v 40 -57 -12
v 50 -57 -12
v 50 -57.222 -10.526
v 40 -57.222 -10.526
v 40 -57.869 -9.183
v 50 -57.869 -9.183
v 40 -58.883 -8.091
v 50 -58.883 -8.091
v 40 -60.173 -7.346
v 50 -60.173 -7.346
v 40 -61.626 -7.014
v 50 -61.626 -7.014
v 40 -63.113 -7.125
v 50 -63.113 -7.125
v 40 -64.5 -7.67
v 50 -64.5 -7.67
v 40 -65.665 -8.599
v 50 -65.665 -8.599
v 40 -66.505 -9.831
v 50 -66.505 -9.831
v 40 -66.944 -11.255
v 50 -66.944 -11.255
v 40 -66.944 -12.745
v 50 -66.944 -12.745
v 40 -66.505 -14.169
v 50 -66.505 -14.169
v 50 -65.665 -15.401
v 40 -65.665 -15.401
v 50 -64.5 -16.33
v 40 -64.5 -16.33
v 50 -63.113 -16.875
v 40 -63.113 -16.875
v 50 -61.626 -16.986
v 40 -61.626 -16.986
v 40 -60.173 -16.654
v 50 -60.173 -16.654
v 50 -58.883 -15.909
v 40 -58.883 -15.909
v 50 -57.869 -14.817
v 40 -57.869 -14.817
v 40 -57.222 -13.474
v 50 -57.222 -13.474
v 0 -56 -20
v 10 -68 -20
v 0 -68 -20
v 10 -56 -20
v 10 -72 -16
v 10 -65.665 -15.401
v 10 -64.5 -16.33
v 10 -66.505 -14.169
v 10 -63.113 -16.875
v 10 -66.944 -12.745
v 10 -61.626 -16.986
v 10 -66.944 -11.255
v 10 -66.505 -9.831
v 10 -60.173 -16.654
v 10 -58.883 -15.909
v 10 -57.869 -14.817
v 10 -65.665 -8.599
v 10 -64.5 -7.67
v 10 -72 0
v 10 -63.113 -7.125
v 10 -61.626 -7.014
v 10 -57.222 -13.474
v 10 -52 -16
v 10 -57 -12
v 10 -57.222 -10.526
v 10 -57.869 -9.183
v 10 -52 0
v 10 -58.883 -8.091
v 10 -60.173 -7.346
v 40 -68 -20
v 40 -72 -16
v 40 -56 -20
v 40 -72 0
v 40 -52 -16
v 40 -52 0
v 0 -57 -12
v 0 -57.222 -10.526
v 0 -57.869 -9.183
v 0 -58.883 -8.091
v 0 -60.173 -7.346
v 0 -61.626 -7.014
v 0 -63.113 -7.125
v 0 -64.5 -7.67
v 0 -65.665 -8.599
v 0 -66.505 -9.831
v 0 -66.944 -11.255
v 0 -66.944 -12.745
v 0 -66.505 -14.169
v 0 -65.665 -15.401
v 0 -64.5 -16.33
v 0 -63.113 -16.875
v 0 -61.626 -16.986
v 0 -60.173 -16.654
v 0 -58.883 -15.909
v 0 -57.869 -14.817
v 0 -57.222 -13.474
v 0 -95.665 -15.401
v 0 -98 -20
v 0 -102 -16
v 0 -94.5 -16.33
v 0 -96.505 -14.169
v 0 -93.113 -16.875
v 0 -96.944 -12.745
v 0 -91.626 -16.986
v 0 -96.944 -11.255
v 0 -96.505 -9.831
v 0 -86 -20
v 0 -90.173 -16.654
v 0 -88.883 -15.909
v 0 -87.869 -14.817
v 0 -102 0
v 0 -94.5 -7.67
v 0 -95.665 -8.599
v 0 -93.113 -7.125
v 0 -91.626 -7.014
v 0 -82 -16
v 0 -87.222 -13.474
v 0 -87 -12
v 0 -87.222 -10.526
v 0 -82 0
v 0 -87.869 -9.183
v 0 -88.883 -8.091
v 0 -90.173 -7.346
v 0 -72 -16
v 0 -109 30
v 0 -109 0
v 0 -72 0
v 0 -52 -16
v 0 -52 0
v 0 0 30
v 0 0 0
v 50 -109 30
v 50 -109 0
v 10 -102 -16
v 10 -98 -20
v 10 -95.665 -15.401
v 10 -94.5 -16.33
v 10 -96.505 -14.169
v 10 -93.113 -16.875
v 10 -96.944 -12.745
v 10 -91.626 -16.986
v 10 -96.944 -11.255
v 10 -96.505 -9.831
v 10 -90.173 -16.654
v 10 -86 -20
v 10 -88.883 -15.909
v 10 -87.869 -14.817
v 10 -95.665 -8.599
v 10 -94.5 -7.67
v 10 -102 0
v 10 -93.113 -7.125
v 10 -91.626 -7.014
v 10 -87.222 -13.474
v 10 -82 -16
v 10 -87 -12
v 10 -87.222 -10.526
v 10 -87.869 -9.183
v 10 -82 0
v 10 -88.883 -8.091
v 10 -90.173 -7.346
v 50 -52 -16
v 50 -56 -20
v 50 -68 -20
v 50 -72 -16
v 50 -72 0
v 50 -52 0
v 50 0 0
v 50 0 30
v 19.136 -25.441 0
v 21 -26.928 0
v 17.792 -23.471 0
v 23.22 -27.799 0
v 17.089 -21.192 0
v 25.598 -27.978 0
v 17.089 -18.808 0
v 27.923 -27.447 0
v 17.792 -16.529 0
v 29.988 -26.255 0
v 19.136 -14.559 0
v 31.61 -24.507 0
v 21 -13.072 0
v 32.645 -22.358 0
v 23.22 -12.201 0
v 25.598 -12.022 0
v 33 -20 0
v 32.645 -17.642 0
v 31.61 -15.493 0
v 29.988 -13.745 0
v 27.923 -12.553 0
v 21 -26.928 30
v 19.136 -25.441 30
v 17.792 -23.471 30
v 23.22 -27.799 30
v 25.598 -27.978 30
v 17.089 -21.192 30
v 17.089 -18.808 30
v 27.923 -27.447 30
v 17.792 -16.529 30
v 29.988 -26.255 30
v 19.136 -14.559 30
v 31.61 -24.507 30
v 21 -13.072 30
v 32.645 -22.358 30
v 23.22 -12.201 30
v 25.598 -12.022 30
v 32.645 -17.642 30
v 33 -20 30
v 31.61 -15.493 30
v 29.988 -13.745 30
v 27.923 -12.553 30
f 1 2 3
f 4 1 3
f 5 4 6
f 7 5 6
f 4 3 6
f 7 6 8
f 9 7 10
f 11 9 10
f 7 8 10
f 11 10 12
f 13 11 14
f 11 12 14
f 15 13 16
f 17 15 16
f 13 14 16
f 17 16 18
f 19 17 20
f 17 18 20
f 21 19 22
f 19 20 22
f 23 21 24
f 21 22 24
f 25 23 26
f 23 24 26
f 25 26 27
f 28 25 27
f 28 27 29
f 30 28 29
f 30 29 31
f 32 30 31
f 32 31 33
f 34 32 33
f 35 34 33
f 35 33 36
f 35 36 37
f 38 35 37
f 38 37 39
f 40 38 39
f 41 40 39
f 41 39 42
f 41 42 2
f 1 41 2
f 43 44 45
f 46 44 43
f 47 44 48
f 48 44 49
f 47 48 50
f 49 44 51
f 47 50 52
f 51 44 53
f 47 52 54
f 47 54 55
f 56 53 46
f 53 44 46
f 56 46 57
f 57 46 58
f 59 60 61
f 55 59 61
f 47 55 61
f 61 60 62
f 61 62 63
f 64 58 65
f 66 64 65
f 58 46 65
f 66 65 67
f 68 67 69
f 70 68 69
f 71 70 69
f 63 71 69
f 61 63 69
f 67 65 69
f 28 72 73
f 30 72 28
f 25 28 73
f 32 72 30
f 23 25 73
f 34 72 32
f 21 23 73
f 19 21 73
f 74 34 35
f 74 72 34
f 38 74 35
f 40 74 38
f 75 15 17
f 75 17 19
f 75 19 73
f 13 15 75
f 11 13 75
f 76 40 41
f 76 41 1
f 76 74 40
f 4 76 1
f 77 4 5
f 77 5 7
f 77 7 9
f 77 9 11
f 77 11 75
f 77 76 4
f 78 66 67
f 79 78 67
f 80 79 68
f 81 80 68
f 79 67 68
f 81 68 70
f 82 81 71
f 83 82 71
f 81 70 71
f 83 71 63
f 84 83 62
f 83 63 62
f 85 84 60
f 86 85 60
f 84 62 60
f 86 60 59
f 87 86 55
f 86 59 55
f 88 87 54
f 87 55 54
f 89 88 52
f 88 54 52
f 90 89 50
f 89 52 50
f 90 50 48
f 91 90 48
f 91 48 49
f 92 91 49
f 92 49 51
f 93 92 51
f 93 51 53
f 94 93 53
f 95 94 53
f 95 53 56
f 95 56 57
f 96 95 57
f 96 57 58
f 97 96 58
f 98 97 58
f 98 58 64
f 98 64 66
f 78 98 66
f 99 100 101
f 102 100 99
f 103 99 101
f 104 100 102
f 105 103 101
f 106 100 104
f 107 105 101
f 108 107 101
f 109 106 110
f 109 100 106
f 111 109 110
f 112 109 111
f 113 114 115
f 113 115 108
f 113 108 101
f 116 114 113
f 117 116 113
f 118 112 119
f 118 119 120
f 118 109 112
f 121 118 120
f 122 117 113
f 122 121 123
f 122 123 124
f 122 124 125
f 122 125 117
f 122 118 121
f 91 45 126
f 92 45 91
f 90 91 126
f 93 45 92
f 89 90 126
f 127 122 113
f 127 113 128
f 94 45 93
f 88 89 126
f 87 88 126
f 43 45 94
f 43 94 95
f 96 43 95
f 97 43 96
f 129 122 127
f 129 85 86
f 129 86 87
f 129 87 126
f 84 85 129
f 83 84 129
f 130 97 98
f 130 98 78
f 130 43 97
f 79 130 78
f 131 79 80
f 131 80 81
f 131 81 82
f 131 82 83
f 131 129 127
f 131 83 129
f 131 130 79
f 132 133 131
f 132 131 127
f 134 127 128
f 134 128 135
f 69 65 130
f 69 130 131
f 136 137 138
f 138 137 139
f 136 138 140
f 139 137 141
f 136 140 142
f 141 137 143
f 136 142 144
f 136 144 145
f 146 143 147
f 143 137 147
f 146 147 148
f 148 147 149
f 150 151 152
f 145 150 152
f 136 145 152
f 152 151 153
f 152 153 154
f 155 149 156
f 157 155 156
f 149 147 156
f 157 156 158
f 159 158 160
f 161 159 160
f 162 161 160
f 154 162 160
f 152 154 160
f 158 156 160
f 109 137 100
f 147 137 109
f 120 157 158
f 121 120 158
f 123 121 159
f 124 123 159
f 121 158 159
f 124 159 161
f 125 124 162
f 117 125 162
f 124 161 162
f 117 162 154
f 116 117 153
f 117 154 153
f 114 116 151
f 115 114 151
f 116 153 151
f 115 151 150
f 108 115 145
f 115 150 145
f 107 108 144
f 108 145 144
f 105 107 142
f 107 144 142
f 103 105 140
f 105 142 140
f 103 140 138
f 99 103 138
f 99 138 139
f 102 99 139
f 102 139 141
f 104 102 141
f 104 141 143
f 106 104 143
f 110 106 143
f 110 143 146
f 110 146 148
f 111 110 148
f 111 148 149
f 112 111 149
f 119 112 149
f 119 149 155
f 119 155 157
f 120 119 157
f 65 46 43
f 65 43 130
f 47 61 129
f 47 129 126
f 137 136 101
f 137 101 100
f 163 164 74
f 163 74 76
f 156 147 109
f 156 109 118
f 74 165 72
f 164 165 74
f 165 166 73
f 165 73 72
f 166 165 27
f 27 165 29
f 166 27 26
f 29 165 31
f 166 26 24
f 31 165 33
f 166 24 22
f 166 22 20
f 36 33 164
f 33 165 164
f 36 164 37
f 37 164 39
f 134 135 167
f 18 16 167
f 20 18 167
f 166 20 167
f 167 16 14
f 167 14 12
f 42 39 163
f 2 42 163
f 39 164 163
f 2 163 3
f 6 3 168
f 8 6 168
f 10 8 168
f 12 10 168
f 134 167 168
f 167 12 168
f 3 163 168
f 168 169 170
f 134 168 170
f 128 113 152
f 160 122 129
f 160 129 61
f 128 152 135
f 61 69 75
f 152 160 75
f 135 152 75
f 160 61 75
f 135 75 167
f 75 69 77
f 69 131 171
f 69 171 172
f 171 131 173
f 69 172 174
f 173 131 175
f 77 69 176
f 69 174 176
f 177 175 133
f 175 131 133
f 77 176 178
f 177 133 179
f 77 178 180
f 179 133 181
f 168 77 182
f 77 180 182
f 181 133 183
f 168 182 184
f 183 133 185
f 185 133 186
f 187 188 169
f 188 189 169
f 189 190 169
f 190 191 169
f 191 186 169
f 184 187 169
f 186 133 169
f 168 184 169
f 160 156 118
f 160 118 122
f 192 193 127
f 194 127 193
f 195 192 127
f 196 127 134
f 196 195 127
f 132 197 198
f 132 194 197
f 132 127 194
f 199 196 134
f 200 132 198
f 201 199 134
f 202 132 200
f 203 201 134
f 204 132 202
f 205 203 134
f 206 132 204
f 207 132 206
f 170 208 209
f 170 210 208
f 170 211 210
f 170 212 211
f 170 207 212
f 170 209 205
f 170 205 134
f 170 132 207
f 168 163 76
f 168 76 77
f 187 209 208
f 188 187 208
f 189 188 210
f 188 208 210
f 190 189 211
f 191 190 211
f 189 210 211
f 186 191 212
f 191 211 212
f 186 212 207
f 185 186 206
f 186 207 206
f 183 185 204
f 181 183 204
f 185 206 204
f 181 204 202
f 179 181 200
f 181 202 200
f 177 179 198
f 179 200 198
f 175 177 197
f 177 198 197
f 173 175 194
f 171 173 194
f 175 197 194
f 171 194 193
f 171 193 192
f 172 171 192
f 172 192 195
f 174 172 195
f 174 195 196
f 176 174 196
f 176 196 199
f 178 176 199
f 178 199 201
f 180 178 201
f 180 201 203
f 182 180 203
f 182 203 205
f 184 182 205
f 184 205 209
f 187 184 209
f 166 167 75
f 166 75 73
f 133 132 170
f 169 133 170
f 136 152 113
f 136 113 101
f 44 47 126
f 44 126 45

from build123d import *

# Parameters (mm, degrees)
F0_W     = 50
F0_H     = 30
F1_DEPTH = 109
F2_R     = 8
F3_DEPTH = 30.001
F4_R     = 5
F5_DEPTH = 50
F6_W     = 30
F6_H     = 20
F7_DEPTH = 109.001
F8_W     = 20
F8_H     = 20
F9_DEPTH = 25


with BuildPart() as f1:
    # F0 (on Front) → F1 (new body)
    with BuildSketch(Plane.XZ):
        with Locations((25, 15)):
            Rectangle(F0_W, F0_H)
    extrude(amount=F1_DEPTH)

    # F2 (on face) → F3 (cut, through all)
    with BuildSketch(Plane.XY.offset(30)):
        with Locations((25, -20)):
            Circle(F2_R)
    extrude(amount=-F3_DEPTH, mode=Mode.SUBTRACT)

    # F4 (on face) → F5 (join)
    with BuildSketch(Plane.YZ.offset(50)):
        Polygon((-52, 0), (-72, 0), (-72, -16), (-68, -20), (-56, -20), (-52, -16), align=None)
        with Locations((-62, -12)):
            Circle(F4_R, mode=Mode.SUBTRACT)
        Polygon((-82, 0), (-102, 0), (-102, -16), (-98, -20), (-86, -20), (-82, -16), align=None)
        with Locations((-92, -12)):
            Circle(F4_R, mode=Mode.SUBTRACT)
    extrude(amount=-F5_DEPTH)

    # F6 (on face) → F7 (cut, through all)
    with BuildSketch(Plane(origin=(0, 0, 0), x_dir=(-1, 0, 0), z_dir=(0, 1, 0))):
        with Locations((-25, -10)):
            Rectangle(F6_W, F6_H)
    extrude(amount=-F7_DEPTH, mode=Mode.SUBTRACT)

    # F8 (on face) → F9 (cut)
    with BuildSketch(Plane.YZ.offset(50)):
        with Locations((-92, -10)):
            Rectangle(F8_W, F8_H)
    extrude(amount=-F9_DEPTH, mode=Mode.SUBTRACT)


solid = f1.part
